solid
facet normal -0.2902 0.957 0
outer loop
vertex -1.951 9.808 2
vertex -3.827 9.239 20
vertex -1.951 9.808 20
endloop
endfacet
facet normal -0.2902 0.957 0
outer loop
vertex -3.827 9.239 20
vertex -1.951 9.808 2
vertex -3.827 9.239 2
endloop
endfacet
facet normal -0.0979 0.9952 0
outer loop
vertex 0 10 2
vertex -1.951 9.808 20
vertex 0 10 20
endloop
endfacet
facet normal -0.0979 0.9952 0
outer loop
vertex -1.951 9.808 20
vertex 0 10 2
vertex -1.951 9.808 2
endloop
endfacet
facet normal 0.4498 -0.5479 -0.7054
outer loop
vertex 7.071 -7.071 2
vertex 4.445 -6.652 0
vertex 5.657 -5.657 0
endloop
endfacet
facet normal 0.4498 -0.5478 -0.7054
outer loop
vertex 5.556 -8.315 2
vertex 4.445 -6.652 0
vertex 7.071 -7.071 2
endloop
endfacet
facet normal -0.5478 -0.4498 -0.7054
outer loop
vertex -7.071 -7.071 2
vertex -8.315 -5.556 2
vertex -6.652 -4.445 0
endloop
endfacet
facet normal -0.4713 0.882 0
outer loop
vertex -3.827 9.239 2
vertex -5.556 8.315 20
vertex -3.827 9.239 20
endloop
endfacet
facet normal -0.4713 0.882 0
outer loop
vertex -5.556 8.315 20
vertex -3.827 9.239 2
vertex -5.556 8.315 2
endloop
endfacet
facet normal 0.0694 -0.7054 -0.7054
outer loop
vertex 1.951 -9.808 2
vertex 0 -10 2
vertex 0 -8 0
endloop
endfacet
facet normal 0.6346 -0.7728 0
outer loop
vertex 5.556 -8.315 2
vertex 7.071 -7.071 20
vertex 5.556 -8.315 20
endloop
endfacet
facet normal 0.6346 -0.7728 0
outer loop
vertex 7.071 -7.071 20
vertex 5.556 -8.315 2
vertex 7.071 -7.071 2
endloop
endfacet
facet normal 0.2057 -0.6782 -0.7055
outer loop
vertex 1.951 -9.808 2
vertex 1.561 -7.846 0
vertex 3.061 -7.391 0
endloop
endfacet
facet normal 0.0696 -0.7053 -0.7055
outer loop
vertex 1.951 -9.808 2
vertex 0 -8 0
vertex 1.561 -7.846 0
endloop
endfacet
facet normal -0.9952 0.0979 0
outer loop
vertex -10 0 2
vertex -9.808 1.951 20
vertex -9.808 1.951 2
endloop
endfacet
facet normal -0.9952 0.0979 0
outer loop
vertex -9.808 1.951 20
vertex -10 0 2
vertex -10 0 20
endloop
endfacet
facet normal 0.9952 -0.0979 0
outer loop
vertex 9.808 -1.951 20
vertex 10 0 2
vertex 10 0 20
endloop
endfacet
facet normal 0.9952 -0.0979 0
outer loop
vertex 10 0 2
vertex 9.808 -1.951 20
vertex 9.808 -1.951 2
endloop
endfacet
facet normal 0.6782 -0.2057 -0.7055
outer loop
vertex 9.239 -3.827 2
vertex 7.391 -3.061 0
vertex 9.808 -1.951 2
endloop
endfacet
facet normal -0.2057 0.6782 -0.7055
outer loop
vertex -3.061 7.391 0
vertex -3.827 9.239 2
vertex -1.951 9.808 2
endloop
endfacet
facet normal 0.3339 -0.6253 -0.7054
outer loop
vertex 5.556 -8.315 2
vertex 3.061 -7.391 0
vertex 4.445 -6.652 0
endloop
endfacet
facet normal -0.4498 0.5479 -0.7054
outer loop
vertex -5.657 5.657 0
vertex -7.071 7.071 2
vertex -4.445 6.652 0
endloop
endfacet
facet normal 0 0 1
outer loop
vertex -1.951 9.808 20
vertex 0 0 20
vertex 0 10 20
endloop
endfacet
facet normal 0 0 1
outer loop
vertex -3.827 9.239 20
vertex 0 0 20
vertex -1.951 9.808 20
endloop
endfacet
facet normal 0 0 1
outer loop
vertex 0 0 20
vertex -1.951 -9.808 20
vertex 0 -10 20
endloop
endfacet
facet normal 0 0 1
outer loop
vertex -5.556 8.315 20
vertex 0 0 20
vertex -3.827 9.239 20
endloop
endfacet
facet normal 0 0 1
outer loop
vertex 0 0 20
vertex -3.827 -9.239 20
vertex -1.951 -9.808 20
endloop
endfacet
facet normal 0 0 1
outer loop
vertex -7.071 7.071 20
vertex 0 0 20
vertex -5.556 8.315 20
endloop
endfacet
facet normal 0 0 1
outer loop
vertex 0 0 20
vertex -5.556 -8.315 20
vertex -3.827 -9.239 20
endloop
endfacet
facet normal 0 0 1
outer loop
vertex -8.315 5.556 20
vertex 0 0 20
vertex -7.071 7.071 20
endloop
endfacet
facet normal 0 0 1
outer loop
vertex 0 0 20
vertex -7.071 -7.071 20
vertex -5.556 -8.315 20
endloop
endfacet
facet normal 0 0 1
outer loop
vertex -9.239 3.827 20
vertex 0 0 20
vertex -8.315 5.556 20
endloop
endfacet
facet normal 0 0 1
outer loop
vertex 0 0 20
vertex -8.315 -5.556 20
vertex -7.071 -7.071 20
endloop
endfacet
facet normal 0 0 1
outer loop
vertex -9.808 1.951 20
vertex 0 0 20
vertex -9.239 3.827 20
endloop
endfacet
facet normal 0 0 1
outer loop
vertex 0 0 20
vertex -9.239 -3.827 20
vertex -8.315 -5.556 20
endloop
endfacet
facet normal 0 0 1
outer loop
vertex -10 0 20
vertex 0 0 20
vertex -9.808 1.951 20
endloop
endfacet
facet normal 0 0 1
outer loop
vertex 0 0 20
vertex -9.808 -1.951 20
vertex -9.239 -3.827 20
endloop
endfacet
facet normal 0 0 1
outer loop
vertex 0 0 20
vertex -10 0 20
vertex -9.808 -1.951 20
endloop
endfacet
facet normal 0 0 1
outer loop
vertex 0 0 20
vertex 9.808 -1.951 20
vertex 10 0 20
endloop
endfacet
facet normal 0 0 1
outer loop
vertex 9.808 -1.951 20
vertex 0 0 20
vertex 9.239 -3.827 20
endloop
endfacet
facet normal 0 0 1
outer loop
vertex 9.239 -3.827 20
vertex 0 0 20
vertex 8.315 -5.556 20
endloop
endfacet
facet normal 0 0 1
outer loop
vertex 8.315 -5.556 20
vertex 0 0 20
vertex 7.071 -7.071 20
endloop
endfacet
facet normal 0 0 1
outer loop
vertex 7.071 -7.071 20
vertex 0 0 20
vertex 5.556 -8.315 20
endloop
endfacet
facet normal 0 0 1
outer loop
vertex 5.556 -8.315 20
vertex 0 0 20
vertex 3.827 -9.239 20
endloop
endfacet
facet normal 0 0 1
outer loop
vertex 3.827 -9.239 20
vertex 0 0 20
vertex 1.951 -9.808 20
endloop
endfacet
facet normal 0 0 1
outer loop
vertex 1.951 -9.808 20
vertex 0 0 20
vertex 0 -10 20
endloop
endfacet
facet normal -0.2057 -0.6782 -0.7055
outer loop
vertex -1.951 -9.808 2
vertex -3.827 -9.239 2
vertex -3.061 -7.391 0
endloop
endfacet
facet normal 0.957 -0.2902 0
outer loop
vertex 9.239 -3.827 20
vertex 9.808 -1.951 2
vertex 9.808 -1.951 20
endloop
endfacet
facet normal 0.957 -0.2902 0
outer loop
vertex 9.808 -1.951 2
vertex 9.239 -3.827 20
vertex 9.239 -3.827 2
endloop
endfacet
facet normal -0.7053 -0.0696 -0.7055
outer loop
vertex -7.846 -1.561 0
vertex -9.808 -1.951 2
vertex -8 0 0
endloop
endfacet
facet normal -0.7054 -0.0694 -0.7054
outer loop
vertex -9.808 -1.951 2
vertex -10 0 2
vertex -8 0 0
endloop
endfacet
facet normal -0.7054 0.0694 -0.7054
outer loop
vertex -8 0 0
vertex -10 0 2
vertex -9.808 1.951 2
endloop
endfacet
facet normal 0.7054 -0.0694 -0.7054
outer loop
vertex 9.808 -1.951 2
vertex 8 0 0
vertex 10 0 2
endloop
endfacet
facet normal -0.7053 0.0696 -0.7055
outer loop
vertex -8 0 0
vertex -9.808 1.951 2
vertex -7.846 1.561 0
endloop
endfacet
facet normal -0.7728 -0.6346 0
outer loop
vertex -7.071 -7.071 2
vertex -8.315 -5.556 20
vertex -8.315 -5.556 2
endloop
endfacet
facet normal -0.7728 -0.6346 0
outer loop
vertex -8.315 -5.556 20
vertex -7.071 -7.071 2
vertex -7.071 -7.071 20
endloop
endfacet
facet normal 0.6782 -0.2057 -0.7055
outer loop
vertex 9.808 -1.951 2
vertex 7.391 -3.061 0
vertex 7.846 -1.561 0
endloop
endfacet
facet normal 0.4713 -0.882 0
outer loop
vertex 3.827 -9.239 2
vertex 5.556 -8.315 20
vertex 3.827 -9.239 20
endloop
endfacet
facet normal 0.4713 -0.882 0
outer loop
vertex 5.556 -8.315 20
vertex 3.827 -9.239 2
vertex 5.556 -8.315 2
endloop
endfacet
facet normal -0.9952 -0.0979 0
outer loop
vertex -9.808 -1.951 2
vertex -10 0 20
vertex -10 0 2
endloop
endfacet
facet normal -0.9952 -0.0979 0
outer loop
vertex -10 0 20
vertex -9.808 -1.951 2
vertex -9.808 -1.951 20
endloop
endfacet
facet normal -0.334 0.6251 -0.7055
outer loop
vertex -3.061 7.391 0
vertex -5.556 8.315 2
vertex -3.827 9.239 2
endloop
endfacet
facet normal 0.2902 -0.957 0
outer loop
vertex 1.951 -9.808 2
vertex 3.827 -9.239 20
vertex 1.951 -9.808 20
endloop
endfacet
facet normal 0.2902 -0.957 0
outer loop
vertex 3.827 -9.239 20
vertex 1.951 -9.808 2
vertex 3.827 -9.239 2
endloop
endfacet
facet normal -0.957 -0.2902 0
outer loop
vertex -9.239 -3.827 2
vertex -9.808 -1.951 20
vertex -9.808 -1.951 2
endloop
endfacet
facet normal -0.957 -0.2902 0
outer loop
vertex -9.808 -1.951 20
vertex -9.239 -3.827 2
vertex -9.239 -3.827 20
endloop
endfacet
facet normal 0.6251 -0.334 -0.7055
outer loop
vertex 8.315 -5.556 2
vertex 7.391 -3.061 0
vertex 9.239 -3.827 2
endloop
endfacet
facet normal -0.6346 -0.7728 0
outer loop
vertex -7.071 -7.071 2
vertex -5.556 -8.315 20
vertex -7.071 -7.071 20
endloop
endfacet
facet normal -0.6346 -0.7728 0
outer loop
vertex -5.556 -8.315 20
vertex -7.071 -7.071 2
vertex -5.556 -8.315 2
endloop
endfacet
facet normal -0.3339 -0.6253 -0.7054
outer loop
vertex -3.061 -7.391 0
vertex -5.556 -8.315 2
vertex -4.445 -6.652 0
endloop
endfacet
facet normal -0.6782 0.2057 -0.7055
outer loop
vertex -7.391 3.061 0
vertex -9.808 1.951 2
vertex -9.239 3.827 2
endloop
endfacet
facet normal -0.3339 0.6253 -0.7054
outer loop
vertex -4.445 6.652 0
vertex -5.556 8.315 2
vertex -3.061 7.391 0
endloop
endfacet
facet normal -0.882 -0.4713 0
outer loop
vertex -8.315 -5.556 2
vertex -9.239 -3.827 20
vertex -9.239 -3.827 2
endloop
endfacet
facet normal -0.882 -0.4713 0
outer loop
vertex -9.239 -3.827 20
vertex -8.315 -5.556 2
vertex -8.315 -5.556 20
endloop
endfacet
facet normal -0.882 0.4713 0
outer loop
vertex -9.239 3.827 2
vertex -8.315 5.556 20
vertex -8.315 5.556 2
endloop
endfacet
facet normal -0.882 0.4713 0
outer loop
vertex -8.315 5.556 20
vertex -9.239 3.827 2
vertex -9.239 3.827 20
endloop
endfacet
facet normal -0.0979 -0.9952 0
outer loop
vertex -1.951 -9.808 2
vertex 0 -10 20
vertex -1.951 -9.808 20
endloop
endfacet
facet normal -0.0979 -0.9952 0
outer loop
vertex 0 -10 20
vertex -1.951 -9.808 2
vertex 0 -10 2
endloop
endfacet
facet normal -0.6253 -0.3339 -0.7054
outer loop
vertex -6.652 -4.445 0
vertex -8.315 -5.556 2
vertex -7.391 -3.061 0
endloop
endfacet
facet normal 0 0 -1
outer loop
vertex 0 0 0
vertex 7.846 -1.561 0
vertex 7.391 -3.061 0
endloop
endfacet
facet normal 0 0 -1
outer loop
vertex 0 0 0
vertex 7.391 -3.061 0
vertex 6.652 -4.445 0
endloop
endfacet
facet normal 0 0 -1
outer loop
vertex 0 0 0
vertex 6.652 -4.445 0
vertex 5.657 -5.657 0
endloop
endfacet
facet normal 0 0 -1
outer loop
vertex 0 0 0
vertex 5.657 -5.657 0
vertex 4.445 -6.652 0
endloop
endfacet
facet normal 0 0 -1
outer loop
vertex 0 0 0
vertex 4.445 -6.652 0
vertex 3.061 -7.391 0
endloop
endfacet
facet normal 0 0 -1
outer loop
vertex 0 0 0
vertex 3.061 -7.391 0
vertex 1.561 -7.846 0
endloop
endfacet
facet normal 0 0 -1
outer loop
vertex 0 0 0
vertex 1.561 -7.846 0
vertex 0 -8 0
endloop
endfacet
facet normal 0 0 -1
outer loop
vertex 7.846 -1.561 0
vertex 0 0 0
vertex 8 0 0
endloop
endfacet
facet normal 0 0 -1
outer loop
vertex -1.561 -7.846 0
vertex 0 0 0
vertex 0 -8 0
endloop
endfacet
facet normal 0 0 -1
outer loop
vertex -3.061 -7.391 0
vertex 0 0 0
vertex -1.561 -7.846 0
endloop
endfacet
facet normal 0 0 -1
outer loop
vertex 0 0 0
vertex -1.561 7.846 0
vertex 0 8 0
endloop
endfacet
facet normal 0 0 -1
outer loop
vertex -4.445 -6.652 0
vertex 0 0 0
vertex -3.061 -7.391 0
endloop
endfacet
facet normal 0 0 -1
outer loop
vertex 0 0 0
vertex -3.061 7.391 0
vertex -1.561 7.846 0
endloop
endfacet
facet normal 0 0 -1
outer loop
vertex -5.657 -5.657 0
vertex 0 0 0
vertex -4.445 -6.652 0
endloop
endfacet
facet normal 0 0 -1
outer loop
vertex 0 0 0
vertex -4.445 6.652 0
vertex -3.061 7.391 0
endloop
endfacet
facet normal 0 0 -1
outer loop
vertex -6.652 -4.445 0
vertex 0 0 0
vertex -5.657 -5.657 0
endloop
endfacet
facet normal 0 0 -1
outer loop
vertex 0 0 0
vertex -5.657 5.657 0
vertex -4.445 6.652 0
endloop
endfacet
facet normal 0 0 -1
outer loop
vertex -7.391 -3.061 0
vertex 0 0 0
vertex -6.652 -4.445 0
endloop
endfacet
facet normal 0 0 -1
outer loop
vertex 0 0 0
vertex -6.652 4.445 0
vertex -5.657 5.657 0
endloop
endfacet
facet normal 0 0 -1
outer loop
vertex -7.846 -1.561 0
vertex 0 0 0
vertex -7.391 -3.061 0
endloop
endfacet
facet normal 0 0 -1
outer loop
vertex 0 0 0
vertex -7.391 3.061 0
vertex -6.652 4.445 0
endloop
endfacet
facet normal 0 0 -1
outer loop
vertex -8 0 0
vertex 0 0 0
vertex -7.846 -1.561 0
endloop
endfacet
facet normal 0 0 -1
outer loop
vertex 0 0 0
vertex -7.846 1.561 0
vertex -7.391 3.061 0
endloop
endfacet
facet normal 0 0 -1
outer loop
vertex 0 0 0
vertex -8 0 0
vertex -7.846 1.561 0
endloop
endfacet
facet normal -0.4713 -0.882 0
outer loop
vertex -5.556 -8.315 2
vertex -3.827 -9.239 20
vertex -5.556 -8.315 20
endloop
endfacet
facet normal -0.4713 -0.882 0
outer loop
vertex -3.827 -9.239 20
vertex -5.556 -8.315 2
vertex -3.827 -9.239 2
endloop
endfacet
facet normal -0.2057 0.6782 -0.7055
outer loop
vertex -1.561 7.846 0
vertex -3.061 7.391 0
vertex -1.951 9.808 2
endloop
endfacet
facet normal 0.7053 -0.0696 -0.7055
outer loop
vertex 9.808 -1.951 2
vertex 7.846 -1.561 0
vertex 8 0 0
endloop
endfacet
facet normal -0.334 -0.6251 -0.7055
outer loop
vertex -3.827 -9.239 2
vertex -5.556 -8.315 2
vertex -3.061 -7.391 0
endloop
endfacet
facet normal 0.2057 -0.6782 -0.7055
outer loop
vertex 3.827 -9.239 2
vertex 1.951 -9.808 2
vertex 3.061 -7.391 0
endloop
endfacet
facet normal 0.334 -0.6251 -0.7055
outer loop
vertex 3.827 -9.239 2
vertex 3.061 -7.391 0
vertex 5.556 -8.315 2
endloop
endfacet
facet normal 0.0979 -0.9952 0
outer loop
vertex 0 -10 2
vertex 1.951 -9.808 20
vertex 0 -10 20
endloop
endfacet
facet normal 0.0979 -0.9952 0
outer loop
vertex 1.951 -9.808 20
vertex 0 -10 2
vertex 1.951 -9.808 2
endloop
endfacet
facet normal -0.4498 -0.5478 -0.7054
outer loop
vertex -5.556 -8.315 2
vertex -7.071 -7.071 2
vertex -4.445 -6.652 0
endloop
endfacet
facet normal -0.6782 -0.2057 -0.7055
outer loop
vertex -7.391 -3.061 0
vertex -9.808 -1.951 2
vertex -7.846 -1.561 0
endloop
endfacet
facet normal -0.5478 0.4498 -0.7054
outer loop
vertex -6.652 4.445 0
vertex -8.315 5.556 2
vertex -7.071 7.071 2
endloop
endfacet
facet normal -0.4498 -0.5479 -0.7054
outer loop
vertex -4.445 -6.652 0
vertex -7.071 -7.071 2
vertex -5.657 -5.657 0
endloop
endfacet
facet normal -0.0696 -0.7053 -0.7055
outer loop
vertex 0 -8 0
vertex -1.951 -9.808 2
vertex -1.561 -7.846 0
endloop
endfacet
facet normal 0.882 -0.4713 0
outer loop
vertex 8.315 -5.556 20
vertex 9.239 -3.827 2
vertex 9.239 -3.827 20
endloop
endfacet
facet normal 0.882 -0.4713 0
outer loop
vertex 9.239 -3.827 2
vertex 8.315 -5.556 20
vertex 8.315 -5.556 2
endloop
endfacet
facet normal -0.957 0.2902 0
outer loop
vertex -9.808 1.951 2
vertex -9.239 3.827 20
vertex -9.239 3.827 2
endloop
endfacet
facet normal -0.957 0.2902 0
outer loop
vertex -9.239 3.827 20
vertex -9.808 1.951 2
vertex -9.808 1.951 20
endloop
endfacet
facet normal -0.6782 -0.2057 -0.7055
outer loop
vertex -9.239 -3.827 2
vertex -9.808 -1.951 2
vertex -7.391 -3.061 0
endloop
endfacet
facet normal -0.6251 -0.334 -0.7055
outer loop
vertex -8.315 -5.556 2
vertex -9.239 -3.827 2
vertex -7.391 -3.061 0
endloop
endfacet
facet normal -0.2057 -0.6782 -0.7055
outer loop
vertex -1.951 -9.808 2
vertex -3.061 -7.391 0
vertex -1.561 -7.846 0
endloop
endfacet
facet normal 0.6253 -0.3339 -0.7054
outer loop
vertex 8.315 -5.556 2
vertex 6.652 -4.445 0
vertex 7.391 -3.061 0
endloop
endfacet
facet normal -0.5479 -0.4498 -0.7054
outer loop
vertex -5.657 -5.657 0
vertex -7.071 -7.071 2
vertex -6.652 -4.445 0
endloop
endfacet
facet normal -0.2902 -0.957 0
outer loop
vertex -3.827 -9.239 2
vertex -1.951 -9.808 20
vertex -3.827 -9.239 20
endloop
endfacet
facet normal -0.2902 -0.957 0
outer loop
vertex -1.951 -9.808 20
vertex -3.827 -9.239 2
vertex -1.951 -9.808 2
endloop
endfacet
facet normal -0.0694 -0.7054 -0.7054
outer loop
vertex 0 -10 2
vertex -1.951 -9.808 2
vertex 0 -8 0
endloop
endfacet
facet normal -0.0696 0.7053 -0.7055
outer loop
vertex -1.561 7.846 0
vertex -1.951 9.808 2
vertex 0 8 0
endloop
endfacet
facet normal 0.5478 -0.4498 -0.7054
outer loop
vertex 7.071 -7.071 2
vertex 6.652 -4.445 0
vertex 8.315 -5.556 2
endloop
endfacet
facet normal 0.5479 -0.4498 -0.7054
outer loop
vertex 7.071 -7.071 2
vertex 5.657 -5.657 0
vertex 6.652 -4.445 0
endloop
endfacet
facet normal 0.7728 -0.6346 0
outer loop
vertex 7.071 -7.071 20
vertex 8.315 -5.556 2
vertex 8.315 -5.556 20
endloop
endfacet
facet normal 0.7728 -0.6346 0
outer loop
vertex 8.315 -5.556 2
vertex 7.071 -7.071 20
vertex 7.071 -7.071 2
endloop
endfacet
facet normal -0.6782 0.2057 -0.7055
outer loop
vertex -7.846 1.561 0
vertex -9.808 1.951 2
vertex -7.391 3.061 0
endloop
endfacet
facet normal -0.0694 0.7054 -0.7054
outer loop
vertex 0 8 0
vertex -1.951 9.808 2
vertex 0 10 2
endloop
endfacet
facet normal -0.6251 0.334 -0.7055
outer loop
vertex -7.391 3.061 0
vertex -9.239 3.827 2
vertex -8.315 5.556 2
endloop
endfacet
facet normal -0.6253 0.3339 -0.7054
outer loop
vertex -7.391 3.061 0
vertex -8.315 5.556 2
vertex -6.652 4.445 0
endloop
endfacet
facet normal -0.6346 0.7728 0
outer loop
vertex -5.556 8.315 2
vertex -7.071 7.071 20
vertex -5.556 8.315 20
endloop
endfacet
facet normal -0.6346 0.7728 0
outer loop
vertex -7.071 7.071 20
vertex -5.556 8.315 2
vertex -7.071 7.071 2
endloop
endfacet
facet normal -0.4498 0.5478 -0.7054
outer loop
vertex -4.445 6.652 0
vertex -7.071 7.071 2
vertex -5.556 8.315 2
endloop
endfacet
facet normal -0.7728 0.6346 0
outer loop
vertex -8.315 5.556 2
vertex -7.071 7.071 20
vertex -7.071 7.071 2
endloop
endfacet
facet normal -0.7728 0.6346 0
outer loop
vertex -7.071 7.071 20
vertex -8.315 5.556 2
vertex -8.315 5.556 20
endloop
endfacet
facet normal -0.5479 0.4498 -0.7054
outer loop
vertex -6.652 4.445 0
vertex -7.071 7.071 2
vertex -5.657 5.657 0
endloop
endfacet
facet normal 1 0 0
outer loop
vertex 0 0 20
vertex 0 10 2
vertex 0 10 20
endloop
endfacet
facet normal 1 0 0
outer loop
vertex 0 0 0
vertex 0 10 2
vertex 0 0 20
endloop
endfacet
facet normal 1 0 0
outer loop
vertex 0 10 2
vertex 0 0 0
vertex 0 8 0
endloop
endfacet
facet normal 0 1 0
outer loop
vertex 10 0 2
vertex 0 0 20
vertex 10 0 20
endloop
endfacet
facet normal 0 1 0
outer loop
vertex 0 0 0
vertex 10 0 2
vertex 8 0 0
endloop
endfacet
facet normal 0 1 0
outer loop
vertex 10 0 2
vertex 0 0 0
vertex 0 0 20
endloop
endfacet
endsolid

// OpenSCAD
// A wall standing on a chamfer, where neither of them goes all the way round.
//
// This is the fixture for a rim shared between two *partial* bands: one arc
// bounding two curved faces, with no planar face anywhere along it.
//
// step-chamfered-cylinder covers the same joint for two closed bands, where
// the shared rim is a whole CIRCLE. That case was already handled, and the
// restriction that came with it - both bands must cover the full turn - is
// what left every bayonet lug faceted, because a lug is a wall on a chamfer on
// a wall and not one of the three closes on itself.
//
// Cutting a quadrant out of the chamfered cylinder reproduces exactly that
// shape with nothing else in it. The result has:
//
//   a CONICAL_SURFACE  270 degree arc, r=8 at z=0 to r=10 at z=2
//   a CYLINDRICAL_SURFACE  270 degree arc, r=10, z=2 to z=20
//
// and between them one arc at r=10, z=2, used by both, once in each
// direction. The far rim of each is a run of edges inside a planar face - the
// bottom disc and the top disc - which is the case that already worked, so
// anything this fixture catches is the shared arc itself.
//
// The cut is made with a cube rather than a wedge on purpose: at $fn = 32 the
// facet boundaries fall at multiples of 11.25 degrees, so both cut planes pass
// exactly through a vertex of every circle in the part. No facet is cut
// through its chord, so no trapezoid is left inside the wall and both arcs end
// on the true circle - see step-partial-cylinder for the case where that is
// not true.
//
// Measured, and asserted by the driver: what the exporter has to report for
// the above to have happened. A silently faceted export is still a valid one,
// so validity alone cannot see a recogniser that has stopped recognising.
// The cone is the hull's own, declared since 2026-09-25 (declareHullOfRevolution,
// see step-chamfered-cylinder); until then it was identified by its rims and
// held on the r = 10 cylinder, which is why the count read 2.
// EXPECT: 3 analytic surfaces available (2 cylindrical, 0 spherical, 0 toroidal, 0 Bezier, 1 conical)
// EXPECT: 2 surfaces recognised (0 toroidal, 0 spherical, 1 conical, 2 partial), 48 facets replaced
//
// Three quarters of step-chamfered-cylinder's 64: 24 wall facets on the r = 10
// cylinder and 24 on the cone, each made by the hull, which declared both. The
// cube's planes pass through vertices, not chords (above), so no corner is moved
// off its surface by the cut, and every one of the 48 is decided by the model.
// The 48 are the hull's, named by derivation from the rings their corners are
// on, not stated by a maker: D1 (checklist E8; D0 by position until
// 2026-09-29).
// EXPECT: what decided each written facet: 0 D0, 48 D1, 0 D2, 0 D3, 0 D4
//
// The chamfered cylinder above with one quadrant cut away, so exactly three
// quarters of 6165.8991814.
// ROUNDTRIP: Cone=1 Cylinder=1 Plane=4
// VOLUME: 4624.4243861
$fn = 32;
difference() {
  hull() {
    translate([0, 0, 2]) cylinder(h = 18, r = 10);
    cylinder(h = 0.01, r = 8);
  }
  translate([0, 0, -1]) cube([20, 20, 30]);
}
